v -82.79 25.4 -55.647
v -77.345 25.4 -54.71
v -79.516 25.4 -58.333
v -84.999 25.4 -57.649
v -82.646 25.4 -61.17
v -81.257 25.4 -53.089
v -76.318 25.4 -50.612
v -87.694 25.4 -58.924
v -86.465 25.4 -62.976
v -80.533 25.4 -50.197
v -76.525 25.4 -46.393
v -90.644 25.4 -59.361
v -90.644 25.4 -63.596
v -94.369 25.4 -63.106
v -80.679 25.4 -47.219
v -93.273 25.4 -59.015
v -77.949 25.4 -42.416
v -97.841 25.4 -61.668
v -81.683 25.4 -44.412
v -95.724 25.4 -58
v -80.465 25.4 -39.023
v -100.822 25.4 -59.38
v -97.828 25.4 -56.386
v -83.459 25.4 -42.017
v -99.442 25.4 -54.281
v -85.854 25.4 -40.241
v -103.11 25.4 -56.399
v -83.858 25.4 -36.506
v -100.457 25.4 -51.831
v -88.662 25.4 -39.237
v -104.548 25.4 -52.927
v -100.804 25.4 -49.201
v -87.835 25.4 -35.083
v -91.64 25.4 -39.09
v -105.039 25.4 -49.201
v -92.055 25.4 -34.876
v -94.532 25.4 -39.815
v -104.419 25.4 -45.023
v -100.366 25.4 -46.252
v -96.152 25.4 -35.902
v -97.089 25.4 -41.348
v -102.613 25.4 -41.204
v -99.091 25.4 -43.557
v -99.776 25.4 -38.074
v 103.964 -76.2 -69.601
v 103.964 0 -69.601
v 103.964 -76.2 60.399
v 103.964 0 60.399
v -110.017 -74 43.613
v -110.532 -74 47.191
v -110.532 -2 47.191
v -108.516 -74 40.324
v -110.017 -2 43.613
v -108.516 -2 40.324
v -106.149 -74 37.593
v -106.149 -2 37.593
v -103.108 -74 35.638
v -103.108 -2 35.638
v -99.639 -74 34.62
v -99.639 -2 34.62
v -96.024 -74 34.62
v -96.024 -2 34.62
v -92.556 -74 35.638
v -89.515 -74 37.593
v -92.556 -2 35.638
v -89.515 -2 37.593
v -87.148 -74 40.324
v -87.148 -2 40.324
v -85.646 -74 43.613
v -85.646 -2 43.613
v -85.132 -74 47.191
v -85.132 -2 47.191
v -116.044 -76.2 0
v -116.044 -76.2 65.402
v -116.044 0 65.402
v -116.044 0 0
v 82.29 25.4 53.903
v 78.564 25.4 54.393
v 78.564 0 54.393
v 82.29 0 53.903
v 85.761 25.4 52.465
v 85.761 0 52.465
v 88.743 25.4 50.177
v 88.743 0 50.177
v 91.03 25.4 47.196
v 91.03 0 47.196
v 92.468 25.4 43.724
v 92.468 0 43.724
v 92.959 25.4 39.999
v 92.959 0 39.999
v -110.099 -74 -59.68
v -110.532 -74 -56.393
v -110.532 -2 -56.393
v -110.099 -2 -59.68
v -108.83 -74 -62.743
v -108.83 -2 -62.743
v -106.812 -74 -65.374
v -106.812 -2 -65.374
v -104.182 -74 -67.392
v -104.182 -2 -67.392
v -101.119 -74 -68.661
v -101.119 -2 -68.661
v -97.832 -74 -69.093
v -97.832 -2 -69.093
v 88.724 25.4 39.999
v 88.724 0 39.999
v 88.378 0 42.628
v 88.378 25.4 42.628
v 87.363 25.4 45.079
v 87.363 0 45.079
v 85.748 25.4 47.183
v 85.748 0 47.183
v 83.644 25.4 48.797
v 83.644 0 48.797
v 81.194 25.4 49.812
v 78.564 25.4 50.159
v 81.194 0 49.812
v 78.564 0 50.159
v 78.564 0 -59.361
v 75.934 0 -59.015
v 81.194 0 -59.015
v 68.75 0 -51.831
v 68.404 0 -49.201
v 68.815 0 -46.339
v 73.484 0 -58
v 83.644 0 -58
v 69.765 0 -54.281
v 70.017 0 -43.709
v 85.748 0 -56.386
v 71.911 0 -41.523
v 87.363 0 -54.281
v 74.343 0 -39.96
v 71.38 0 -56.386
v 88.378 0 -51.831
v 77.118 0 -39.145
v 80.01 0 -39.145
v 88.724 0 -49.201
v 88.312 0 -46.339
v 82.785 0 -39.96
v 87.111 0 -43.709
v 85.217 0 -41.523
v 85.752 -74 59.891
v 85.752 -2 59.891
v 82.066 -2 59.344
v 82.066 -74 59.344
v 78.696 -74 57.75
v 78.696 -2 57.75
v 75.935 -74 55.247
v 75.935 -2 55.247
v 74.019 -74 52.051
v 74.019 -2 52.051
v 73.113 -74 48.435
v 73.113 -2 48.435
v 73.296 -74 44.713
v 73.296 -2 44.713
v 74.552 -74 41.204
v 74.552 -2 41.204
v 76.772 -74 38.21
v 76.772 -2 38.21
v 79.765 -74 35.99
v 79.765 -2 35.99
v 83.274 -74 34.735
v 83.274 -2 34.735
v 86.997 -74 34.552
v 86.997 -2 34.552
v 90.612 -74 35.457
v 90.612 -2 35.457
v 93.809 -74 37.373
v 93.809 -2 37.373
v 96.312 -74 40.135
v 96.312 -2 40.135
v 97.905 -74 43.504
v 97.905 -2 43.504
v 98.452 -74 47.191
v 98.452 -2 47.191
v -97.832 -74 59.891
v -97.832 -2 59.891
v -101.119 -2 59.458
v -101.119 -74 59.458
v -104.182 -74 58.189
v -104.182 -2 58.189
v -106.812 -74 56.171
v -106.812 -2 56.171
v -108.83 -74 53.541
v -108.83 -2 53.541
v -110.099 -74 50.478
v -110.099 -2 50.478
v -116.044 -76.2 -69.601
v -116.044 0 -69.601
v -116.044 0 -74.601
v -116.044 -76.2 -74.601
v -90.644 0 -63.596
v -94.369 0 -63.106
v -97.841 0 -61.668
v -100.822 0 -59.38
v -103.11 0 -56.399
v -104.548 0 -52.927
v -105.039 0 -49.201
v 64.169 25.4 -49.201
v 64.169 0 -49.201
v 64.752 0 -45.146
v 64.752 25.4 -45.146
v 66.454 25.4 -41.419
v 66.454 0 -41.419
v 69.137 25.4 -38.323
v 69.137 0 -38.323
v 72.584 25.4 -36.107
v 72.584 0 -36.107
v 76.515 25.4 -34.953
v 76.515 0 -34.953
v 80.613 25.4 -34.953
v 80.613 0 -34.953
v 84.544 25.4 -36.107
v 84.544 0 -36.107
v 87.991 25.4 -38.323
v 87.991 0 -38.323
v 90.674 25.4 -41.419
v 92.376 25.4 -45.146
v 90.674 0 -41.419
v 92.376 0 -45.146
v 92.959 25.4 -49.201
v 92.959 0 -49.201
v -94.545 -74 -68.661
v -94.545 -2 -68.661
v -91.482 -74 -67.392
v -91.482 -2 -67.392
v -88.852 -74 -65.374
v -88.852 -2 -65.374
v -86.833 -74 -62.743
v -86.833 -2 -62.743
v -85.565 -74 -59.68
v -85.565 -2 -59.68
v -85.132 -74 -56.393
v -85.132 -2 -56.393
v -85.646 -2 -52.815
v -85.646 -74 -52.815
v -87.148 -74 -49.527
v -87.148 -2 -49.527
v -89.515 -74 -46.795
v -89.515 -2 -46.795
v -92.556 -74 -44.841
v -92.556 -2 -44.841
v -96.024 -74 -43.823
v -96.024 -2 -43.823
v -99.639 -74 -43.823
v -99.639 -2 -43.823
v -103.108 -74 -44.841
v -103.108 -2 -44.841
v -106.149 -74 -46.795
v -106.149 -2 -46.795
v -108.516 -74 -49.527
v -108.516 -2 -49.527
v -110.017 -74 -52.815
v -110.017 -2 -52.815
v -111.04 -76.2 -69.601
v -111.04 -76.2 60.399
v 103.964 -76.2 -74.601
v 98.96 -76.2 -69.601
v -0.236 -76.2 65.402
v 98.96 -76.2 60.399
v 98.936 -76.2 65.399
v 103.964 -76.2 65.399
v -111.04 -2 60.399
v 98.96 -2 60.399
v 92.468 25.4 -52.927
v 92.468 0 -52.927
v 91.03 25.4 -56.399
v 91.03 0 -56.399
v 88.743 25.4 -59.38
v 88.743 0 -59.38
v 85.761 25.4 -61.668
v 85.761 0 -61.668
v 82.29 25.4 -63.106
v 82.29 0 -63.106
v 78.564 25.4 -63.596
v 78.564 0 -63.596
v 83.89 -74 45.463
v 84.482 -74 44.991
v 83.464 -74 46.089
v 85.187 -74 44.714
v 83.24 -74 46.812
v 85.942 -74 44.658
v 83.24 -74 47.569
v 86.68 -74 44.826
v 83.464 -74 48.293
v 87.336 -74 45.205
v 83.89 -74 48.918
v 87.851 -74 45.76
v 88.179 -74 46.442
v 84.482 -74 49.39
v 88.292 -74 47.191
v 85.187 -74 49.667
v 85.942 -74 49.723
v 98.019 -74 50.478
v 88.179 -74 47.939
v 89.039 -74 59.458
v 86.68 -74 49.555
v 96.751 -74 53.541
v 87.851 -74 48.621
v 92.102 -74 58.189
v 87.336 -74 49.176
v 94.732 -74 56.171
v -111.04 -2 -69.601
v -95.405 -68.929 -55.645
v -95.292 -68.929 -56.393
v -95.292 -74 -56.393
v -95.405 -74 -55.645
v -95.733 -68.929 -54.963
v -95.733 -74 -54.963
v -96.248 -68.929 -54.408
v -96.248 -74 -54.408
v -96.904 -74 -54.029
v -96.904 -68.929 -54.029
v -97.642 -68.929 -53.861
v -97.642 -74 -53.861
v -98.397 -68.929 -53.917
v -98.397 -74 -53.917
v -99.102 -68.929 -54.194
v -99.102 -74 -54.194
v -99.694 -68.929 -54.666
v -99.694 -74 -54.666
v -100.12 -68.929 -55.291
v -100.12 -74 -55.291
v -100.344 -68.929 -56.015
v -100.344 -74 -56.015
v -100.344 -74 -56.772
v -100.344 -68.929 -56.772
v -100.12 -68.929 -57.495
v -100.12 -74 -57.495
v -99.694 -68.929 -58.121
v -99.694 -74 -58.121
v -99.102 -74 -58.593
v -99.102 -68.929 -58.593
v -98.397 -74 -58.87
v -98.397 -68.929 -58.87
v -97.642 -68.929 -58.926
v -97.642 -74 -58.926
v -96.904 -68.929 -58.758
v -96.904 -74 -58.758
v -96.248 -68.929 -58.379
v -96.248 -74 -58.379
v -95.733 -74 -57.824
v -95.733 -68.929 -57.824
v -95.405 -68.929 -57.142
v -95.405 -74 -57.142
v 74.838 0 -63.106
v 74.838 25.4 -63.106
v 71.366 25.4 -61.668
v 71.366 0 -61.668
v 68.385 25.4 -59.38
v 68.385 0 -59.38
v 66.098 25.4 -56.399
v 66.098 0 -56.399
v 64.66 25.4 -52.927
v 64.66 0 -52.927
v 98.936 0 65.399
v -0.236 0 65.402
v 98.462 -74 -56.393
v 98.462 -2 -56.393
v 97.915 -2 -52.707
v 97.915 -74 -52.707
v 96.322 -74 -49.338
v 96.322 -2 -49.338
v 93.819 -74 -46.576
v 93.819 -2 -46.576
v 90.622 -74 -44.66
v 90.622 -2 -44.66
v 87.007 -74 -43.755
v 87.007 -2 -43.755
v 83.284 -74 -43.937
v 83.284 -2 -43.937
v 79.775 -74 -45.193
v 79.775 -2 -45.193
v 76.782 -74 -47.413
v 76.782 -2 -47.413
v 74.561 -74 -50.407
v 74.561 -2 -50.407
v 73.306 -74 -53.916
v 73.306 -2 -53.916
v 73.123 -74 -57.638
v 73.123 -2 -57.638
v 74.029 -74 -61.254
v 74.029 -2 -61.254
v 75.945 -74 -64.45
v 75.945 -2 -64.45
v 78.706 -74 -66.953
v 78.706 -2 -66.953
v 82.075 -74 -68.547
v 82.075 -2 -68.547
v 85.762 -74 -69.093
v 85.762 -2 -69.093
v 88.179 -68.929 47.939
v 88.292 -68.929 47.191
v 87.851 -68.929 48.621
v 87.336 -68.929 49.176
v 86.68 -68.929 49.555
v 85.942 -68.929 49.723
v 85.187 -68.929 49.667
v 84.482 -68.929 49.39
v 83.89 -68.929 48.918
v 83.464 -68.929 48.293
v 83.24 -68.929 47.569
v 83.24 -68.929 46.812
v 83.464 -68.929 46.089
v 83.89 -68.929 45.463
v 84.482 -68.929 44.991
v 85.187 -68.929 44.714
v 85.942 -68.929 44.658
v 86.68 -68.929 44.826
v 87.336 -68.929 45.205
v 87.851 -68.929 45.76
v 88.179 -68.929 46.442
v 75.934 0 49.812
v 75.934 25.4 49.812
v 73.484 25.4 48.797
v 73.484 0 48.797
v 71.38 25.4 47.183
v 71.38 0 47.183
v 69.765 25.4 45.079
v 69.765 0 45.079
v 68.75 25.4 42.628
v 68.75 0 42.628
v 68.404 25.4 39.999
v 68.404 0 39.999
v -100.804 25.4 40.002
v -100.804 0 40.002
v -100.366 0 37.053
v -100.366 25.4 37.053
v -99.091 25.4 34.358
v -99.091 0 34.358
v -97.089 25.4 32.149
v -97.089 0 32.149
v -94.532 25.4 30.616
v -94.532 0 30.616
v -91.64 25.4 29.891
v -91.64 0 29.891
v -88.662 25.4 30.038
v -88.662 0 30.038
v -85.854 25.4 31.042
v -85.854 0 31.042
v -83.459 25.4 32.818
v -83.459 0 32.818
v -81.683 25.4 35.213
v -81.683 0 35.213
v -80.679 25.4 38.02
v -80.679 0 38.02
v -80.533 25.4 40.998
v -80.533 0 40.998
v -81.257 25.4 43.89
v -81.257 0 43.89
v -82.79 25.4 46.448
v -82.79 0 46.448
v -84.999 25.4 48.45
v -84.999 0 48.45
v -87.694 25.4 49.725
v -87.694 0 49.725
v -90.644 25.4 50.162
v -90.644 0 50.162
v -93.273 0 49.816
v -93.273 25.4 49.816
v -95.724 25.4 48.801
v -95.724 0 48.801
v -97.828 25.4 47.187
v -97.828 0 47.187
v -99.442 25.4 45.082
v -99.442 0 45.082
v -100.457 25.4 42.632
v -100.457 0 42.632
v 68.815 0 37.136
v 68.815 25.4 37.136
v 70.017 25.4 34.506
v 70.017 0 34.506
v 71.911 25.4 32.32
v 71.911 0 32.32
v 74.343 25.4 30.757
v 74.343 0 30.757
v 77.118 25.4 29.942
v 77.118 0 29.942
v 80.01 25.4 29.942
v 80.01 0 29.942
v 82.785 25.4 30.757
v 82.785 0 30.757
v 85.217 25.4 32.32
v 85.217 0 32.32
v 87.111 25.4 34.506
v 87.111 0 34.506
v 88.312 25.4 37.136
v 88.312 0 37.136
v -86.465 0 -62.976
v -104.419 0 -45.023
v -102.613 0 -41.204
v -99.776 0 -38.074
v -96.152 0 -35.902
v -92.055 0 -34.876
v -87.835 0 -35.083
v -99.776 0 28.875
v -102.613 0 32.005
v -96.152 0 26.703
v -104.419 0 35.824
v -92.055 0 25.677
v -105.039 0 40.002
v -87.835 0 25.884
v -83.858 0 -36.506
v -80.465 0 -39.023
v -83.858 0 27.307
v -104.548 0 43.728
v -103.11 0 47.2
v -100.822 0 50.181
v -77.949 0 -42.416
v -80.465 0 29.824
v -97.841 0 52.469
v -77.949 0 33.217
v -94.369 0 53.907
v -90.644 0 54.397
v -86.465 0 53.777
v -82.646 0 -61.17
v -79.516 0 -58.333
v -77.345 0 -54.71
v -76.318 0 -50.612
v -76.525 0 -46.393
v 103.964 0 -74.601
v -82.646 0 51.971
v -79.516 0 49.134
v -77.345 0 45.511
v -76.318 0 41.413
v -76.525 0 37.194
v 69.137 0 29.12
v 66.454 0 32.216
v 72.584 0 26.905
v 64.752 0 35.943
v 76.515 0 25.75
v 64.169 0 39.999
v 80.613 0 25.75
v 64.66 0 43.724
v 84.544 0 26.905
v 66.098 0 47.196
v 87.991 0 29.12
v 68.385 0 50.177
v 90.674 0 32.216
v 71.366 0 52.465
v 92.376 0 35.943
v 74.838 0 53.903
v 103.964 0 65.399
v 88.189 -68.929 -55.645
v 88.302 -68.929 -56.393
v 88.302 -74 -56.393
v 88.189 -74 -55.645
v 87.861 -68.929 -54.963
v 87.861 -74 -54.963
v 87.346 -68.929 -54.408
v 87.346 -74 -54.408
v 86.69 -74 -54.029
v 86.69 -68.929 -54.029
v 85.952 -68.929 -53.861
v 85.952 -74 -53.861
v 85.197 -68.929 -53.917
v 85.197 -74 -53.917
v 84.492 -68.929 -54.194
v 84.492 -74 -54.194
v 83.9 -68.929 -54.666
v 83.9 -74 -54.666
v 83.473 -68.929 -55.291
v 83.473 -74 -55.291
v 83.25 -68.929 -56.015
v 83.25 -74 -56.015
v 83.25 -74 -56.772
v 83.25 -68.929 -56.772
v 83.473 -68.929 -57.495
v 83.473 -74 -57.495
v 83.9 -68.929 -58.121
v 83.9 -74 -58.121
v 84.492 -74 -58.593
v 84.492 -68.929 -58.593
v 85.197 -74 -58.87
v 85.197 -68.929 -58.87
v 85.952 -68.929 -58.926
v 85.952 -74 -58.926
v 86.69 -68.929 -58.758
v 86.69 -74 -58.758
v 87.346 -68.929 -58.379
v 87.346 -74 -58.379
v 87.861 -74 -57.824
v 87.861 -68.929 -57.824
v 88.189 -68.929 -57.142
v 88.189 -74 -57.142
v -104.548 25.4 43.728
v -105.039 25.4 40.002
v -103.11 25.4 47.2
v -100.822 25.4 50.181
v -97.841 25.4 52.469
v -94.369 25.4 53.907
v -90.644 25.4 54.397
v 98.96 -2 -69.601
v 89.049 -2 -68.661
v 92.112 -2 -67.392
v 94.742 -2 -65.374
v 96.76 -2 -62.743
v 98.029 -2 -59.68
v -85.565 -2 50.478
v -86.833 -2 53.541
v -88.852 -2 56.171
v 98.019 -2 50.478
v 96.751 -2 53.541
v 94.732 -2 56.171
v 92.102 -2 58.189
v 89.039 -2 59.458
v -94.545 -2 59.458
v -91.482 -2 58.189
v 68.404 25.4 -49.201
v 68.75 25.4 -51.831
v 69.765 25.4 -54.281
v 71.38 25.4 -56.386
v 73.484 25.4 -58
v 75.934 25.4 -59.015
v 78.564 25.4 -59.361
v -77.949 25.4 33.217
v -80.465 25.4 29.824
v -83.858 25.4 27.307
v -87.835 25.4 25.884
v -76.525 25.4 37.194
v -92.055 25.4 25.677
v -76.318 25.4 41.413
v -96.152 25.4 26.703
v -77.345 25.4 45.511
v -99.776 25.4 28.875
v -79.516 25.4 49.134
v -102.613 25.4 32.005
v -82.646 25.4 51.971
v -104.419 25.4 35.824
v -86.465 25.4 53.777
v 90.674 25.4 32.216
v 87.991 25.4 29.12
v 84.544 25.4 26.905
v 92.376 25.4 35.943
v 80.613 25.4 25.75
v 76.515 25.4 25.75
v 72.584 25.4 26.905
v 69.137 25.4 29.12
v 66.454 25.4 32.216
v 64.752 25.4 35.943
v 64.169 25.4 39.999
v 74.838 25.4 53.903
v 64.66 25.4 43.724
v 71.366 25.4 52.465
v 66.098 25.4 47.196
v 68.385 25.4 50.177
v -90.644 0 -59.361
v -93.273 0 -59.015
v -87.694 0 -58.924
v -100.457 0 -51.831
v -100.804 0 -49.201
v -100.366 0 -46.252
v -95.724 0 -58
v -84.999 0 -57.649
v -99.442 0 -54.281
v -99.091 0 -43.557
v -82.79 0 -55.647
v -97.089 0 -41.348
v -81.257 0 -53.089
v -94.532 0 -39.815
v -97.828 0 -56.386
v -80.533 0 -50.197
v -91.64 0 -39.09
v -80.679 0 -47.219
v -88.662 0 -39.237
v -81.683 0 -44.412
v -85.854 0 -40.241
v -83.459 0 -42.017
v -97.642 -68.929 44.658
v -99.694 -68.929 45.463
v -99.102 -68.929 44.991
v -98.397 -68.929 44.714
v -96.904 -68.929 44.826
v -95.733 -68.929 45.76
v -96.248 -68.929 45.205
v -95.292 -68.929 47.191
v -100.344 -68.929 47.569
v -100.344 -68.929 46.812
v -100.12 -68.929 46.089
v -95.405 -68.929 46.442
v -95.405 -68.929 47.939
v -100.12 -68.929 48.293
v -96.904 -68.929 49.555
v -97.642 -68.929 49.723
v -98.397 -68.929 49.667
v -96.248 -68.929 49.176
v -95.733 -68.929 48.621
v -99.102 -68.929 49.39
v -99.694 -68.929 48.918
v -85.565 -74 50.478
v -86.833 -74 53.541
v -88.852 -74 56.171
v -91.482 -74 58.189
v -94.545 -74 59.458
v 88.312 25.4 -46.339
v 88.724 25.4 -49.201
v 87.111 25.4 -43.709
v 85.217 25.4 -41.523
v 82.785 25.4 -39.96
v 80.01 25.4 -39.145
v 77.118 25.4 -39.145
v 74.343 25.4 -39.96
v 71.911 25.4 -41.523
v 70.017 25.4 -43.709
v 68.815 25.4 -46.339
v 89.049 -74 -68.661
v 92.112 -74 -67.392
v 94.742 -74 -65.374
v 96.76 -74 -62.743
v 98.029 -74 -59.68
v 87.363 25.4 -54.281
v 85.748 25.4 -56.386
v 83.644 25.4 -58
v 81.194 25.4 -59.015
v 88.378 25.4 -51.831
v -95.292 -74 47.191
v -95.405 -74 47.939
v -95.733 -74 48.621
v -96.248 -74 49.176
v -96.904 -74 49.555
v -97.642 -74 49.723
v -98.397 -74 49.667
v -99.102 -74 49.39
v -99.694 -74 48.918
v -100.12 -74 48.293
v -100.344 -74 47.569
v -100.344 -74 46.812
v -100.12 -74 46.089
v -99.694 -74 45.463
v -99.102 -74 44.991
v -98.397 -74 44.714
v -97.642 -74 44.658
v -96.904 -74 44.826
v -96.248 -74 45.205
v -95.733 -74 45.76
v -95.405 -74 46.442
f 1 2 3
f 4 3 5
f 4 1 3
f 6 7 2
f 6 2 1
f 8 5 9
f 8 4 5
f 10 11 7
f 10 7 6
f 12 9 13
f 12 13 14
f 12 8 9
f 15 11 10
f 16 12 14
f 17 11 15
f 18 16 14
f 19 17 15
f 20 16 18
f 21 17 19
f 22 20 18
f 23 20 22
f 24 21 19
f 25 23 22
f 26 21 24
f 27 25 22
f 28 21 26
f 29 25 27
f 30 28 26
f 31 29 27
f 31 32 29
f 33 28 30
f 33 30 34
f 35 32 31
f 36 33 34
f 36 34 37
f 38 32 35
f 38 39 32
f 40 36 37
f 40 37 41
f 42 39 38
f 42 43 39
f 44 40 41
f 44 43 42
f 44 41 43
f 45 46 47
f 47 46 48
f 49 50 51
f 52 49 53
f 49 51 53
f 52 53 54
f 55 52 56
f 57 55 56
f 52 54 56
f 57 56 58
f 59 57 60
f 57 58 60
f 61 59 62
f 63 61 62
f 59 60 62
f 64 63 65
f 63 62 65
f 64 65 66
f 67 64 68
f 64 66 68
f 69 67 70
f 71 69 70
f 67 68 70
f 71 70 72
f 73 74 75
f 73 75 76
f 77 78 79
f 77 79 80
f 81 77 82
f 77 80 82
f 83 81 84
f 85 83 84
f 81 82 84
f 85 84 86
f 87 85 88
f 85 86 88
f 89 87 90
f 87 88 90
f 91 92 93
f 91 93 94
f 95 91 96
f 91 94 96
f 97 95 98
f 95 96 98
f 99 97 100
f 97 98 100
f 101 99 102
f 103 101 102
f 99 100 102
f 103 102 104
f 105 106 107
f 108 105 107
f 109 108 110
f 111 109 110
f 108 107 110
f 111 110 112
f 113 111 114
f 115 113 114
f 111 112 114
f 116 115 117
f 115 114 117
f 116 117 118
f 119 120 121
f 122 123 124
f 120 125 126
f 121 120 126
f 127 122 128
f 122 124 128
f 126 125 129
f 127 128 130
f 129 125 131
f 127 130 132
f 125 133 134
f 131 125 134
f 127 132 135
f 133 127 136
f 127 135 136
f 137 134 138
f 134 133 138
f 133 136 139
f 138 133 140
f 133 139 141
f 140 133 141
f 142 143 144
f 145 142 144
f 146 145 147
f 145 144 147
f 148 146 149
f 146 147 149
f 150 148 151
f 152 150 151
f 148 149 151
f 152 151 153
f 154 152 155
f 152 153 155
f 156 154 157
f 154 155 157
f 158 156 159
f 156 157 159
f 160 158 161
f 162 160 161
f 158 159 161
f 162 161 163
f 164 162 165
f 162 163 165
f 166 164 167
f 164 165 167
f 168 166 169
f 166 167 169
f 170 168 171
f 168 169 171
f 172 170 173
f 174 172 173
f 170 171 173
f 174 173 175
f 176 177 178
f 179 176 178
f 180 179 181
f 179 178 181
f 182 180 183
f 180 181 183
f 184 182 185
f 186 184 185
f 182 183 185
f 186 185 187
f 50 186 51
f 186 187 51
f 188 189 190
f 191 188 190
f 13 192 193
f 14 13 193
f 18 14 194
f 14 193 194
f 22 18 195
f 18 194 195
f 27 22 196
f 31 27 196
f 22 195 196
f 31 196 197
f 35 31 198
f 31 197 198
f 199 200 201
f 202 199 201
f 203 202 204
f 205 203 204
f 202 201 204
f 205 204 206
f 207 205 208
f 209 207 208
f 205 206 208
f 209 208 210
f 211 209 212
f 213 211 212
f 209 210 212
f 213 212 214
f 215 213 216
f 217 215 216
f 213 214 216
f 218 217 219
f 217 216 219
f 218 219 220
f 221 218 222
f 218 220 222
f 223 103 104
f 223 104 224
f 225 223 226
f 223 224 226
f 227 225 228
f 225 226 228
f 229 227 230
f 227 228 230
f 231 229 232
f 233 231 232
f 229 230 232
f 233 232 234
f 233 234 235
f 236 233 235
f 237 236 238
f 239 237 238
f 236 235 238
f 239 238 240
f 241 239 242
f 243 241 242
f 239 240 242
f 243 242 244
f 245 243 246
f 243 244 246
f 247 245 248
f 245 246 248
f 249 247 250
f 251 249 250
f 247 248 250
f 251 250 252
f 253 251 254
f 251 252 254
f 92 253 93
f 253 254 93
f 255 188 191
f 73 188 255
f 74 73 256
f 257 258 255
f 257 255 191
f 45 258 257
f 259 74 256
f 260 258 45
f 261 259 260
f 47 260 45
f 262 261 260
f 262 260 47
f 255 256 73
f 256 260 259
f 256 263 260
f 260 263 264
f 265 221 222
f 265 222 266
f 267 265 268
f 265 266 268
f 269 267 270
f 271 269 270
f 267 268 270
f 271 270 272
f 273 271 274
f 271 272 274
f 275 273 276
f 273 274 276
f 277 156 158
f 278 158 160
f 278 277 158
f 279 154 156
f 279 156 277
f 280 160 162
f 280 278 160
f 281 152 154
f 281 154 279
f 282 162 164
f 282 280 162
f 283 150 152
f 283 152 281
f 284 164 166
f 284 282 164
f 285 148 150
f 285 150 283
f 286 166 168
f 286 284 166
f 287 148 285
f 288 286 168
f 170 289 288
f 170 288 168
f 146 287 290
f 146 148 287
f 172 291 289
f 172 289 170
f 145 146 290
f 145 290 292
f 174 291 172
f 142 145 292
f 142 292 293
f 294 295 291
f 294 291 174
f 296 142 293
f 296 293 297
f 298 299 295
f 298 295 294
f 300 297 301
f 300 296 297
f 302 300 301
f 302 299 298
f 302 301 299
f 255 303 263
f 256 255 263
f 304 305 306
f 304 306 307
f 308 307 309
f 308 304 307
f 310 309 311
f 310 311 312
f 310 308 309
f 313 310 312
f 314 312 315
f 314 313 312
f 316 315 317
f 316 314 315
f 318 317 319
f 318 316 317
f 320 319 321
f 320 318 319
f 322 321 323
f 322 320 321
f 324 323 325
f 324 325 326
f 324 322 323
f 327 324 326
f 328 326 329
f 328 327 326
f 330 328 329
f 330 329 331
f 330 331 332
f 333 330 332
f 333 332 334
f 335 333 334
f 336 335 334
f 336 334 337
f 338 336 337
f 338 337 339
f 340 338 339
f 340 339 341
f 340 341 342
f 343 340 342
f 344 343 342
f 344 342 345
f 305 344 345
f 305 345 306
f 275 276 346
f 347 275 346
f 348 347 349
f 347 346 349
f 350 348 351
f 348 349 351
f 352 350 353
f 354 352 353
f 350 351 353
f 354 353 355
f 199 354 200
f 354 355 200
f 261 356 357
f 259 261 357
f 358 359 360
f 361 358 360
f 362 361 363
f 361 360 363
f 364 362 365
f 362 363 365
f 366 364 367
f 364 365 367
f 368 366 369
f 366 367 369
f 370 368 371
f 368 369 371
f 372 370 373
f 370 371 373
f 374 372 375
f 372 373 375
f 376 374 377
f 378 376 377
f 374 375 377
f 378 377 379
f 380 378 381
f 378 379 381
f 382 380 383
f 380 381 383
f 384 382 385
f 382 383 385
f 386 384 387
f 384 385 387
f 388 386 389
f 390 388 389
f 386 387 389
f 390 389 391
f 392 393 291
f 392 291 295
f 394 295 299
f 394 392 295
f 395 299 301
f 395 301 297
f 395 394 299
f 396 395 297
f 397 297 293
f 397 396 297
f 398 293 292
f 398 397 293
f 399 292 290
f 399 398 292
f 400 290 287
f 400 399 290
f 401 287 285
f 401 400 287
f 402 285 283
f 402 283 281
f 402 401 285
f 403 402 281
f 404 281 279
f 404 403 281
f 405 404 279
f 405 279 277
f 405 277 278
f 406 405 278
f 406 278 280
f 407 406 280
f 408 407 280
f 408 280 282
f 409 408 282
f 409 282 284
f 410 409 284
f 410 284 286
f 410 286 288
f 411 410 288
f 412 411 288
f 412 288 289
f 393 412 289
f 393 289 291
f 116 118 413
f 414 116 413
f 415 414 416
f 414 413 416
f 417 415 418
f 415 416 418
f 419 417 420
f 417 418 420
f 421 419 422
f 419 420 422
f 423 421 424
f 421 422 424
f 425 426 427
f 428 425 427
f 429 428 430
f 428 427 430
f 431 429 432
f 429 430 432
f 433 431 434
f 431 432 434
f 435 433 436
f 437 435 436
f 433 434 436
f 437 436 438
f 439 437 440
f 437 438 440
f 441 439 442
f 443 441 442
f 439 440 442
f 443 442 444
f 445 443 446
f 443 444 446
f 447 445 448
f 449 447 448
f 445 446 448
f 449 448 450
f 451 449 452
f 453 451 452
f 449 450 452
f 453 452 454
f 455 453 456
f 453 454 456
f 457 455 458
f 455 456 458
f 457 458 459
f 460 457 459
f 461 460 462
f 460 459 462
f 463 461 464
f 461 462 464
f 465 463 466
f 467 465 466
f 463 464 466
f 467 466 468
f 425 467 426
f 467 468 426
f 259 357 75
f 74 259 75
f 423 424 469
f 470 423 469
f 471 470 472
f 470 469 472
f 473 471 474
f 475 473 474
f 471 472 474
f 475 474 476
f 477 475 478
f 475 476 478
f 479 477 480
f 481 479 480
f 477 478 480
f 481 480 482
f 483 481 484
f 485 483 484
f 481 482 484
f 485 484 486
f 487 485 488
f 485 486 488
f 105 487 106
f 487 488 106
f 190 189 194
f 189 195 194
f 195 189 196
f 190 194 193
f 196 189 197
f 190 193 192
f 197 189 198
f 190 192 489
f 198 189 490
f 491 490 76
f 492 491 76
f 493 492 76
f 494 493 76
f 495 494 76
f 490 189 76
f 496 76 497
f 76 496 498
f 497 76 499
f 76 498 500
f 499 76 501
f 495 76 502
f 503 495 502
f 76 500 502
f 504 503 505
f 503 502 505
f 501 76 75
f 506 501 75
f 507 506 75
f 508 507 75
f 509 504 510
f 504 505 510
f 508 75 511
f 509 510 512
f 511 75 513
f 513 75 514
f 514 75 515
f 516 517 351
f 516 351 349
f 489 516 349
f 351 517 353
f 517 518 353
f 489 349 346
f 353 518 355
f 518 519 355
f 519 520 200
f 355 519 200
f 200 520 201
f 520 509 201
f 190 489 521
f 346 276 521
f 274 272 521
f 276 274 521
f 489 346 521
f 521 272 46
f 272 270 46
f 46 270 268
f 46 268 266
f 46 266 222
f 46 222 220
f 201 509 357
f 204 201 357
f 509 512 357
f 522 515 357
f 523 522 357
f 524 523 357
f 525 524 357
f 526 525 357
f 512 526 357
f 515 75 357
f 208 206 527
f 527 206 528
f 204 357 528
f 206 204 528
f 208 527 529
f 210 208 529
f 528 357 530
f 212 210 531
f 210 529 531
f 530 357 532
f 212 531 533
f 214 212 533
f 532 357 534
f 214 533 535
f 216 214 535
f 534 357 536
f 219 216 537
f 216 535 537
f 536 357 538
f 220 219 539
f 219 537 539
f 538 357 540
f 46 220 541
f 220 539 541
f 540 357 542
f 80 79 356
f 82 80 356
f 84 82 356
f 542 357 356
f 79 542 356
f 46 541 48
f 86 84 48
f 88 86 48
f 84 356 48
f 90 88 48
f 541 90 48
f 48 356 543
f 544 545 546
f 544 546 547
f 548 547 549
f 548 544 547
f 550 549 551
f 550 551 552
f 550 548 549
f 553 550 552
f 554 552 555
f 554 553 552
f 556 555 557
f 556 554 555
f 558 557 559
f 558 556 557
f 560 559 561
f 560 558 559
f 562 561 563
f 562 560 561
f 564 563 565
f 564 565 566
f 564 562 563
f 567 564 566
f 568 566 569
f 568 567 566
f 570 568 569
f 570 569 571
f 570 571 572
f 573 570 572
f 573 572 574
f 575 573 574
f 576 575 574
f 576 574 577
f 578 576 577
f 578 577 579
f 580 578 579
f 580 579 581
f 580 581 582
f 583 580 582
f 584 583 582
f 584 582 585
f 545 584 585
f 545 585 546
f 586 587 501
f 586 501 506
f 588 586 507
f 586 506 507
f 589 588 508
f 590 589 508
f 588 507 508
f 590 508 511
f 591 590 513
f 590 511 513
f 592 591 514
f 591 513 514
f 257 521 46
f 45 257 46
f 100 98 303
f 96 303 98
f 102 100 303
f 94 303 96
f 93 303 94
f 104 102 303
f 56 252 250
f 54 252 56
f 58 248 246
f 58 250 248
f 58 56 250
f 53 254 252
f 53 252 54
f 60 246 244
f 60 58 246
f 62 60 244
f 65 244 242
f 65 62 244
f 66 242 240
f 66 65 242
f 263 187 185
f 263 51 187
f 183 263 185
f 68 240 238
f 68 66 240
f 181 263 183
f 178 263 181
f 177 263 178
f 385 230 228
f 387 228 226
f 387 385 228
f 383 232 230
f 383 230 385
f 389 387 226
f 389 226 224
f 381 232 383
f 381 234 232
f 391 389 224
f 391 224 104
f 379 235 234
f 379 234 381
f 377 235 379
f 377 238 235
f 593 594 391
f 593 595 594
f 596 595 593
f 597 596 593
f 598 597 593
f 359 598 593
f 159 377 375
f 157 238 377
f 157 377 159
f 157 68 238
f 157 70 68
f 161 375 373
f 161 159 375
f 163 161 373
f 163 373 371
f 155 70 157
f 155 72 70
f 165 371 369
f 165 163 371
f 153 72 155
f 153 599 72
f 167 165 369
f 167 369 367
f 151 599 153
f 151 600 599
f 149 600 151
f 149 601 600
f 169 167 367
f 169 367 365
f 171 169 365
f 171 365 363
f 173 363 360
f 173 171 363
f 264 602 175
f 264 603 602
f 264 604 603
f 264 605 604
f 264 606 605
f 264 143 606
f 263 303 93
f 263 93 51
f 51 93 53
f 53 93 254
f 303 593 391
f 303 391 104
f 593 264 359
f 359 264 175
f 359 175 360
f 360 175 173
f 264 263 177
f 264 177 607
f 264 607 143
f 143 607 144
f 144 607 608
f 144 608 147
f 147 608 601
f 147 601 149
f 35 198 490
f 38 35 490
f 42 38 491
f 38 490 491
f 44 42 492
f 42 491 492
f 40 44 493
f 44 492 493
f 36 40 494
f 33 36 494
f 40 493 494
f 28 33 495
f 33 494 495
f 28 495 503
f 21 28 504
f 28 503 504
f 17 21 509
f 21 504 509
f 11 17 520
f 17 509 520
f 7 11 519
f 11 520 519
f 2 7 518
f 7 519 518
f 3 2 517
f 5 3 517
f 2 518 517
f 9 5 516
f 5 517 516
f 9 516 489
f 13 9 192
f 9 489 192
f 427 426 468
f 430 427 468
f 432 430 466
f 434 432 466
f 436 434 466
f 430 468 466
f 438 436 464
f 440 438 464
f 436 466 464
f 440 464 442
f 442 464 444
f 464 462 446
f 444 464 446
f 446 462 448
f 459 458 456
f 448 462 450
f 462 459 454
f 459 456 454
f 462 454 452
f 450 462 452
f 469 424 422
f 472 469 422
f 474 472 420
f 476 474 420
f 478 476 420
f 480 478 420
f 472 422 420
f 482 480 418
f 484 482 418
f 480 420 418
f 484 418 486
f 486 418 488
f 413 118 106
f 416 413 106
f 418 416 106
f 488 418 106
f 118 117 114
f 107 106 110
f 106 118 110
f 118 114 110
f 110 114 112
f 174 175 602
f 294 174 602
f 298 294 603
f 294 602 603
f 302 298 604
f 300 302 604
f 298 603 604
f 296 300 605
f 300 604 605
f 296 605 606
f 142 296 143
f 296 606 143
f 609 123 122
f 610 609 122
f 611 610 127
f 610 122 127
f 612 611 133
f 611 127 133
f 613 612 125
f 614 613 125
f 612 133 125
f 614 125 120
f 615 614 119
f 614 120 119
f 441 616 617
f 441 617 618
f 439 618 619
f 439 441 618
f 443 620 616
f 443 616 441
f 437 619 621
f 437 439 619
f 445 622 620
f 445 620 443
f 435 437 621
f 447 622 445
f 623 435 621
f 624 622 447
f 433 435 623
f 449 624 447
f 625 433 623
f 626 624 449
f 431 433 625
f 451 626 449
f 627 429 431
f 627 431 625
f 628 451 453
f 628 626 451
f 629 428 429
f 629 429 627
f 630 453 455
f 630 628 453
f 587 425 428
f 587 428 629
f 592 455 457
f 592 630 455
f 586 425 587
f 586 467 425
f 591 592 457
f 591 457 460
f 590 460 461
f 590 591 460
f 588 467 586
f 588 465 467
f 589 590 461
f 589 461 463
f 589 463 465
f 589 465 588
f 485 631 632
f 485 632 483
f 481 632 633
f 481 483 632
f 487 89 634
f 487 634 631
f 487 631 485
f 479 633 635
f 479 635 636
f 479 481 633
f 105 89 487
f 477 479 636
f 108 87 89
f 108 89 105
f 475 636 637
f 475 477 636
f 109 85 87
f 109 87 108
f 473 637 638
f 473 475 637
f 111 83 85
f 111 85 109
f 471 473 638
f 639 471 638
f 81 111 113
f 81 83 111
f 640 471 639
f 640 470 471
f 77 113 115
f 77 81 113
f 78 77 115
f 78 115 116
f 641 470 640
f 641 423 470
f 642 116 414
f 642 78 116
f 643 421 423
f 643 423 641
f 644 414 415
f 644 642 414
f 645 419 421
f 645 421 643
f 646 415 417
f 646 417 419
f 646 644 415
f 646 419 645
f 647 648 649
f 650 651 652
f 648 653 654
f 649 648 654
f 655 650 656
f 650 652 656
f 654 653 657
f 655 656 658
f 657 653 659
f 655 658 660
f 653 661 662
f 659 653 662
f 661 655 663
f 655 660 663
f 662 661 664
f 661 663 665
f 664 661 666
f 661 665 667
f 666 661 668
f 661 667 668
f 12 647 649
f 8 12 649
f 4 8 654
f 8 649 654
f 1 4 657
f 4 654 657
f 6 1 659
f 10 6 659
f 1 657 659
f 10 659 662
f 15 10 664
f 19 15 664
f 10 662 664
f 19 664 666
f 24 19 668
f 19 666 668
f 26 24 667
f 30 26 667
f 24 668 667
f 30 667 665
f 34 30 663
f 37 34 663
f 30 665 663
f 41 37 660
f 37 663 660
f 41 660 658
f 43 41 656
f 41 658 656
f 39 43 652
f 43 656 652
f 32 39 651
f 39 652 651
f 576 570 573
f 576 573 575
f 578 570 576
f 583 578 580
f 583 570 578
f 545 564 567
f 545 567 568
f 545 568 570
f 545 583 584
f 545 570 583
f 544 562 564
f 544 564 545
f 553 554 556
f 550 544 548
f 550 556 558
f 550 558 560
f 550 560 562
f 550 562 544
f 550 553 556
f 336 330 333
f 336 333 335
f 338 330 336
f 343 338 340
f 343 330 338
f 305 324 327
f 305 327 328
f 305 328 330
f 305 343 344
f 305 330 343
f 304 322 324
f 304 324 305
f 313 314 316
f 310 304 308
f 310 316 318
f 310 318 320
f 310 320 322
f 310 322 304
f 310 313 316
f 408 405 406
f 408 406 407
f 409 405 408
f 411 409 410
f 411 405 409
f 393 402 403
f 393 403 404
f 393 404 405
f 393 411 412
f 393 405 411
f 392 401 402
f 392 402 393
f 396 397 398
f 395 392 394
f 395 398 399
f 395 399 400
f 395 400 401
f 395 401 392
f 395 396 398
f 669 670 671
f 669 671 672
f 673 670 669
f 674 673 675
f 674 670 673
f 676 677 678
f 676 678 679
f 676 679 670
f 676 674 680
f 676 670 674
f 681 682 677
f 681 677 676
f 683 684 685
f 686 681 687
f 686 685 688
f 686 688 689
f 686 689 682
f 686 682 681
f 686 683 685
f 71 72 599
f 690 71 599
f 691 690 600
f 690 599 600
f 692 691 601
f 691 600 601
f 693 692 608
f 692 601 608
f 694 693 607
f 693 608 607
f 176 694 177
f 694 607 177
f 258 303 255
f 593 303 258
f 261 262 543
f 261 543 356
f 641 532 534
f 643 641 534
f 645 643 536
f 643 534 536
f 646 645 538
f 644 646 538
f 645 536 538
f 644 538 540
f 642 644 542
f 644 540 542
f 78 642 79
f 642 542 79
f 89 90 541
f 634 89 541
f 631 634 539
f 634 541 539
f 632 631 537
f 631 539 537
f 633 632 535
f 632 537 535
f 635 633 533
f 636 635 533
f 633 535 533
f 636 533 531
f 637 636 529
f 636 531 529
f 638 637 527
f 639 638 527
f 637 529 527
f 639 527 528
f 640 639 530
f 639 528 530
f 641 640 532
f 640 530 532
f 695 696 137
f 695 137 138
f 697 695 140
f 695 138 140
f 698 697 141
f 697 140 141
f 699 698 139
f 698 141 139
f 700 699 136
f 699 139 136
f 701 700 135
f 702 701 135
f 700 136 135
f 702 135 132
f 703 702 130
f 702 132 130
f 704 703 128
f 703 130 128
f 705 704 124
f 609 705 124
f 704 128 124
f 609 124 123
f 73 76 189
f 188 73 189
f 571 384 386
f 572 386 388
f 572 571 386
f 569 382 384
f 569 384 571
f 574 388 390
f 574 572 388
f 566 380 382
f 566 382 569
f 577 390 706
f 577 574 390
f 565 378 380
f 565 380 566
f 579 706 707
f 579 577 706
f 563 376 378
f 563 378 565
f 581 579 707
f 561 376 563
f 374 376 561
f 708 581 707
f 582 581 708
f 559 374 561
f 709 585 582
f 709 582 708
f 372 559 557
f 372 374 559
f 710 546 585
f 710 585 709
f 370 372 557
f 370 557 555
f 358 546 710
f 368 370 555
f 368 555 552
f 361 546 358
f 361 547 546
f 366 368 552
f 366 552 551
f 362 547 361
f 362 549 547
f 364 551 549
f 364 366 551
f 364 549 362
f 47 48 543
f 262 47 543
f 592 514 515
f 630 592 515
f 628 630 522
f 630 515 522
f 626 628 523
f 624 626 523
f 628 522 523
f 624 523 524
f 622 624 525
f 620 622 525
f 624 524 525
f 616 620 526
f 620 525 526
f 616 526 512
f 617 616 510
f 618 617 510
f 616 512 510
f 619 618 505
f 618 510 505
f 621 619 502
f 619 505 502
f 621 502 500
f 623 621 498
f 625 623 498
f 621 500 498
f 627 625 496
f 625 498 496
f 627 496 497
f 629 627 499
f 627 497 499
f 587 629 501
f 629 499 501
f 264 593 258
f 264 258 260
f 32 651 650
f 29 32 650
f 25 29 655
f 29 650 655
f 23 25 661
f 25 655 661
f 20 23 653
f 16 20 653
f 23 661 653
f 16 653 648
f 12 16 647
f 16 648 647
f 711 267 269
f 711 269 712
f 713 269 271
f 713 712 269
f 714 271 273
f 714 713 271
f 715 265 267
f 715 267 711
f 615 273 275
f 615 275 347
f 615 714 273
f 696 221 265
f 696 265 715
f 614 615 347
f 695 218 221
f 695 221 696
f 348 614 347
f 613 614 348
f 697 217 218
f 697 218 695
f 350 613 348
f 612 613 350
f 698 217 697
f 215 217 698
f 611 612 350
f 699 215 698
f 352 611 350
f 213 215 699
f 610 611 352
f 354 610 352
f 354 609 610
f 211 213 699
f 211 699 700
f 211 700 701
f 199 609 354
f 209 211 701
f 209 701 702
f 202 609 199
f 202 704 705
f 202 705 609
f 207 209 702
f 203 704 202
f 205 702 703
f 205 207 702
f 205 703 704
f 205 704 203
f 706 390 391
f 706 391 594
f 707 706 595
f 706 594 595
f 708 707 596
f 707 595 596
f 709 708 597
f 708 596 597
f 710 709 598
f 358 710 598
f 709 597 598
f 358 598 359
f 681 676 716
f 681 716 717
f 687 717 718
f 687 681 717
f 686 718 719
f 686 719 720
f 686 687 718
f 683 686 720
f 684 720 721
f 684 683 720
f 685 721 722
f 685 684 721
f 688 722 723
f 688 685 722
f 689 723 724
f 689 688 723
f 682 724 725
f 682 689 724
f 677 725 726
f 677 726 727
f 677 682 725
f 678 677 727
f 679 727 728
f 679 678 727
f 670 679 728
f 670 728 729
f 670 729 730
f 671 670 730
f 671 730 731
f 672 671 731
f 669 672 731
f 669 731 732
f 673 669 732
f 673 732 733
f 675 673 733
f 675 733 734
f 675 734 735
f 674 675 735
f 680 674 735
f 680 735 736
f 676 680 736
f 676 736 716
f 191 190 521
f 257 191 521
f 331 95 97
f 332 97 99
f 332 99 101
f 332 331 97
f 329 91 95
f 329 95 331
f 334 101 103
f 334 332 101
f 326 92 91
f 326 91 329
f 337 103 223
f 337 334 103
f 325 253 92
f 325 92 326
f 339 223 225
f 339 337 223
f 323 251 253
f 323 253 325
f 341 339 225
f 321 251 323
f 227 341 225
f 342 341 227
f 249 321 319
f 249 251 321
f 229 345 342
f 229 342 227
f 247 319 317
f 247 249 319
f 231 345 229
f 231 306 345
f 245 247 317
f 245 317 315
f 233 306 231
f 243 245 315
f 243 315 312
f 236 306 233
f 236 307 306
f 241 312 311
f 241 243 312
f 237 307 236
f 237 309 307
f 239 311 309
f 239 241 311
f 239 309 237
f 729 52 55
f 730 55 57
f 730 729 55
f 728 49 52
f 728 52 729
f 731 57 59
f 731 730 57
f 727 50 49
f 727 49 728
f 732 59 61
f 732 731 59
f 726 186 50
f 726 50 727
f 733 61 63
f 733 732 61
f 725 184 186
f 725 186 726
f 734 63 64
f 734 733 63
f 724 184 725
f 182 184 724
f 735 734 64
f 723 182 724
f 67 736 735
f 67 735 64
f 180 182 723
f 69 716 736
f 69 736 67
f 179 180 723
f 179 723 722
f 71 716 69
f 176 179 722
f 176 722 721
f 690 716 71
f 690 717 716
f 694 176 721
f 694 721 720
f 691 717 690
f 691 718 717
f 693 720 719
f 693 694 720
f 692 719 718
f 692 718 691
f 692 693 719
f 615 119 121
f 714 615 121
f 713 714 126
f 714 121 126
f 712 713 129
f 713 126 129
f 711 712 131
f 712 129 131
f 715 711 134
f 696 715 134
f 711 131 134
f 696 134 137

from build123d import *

# Parameters (mm, degrees)
F0_W     = 210
F0_H     = 130
F1_DEPTH = 2
F2_DEPTH = 76.2
F4_DEPTH = 25.4
F5_R     = 2.54
F6_DEPTH = 72
F7_DEPTH = 66.929


with BuildPart() as f1:
    # F0 (on Front) → F1 (new body)
    with BuildSketch(Plane.XZ):
        with Locations((-6.0398806084, -4.6014347222)):
            Rectangle(F0_W, F0_H)
    extrude(amount=F1_DEPTH)

    # F0 (on Front) → F2 (join)
    with BuildSketch(Plane.XZ):
        Polygon((-0.235864222, 65.4023652778), (-111.0638493299, 65.4023652778), (-116.0436806083, 65.4023652778), (-116.0436806083, 60.398529828), (-116.0436806083, -4.06776e-05), (-116.0436806084, -69.6014285846), (-116.0436806084, -74.6014347222), (-111.0398806084, -74.6014347222), (98.9601193916, -74.6014347222), (103.9639193853, -74.6014347222), (103.9639193853, -69.6011838004), (103.9639193916, 60.3988544052), (103.9639193916, 65.3985652778), (98.9361506701, 65.3985652778), align=None)
        with Locations((-6.0398806084, -4.6014347222)):
            Rectangle(F0_W, F0_H, mode=Mode.SUBTRACT)
    extrude(amount=F2_DEPTH)

    # F3 (on face) → F4 (join)
    with BuildSketch(Plane(origin=(0, 0, 0), x_dir=(-1, 0, 0), z_dir=(0, 1, 0))):
        with BuildLine():
            ThreePointArc((-92.9588075555, 39.9985652778), (-78.5639193916, 25.6036771139), (-64.1690312277, 39.9985652778))
            ThreePointArc((-64.1690312277, 39.9985652778), (-68.3851963565, 50.1772883129), (-78.5639193916, 54.3934534417))
            Line((-78.5639193916, 54.3934534417), (-78.5639193916, 50.1585652778))
            ThreePointArc((-78.5639193916, 50.1585652778), (-71.3797144948, 47.1827701747), (-68.4039193916, 39.9985652778))
            ThreePointArc((-68.4039193916, 39.9985652778), (-78.5639193916, 29.8385652778), (-88.7239193916, 39.9985652778))
            Line((-88.7239193916, 39.9985652778), (-92.9588075555, 39.9985652778))
        make_face()
        with BuildLine():
            Line((-78.5639193916, 50.1585652778), (-78.5639193916, 54.3934534417))
            ThreePointArc((-78.5639193916, 54.3934534417), (-88.7426424267, 50.1772883129), (-92.9588075555, 39.9985652778))
            Line((-92.9588075555, 39.9985652778), (-88.7239193916, 39.9985652778))
            ThreePointArc((-88.7239193916, 39.9985652778), (-85.7481242885, 47.1827701747), (-78.5639193916, 50.1585652778))
        make_face()
        with BuildLine():
            ThreePointArc((-64.1690312214, -49.2014347222), (-78.5639193853, -34.8065465583), (-92.9588075492, -49.2014347222))
            Line((-92.9588075492, -49.2014347222), (-88.7239193853, -49.2014347222))
            ThreePointArc((-88.7239193853, -49.2014347222), (-78.5639193853, -39.0414347222), (-68.4039193853, -49.2014347222))
            ThreePointArc((-68.4039193853, -49.2014347222), (-71.3797144885, -56.385639619), (-78.5639193853, -59.3614347222))
            Line((-78.5639193853, -59.3614347222), (-78.5639193853, -63.5963228861))
            ThreePointArc((-78.5639193853, -63.5963228861), (-68.3851963502, -59.3801577573), (-64.1690312214, -49.2014347222))
        make_face()
        with BuildLine():
            Line((-88.7239193853, -49.2014347222), (-92.9588075492, -49.2014347222))
            ThreePointArc((-92.9588075492, -49.2014347222), (-88.7426424204, -59.3801577573), (-78.5639193853, -63.5963228861))
            Line((-78.5639193853, -63.5963228861), (-78.5639193853, -59.3614347222))
            ThreePointArc((-78.5639193853, -59.3614347222), (-85.7481242822, -56.385639619), (-88.7239193853, -49.2014347222))
        make_face()
        with BuildLine():
            ThreePointArc((105.0385687722, 40.0023652778), (100.8224036434, 50.1810883129), (90.6436806083, 54.3972534417))
            Line((90.6436806083, 54.3972534417), (90.6436806083, 50.1623652778))
            ThreePointArc((90.6436806083, 50.1623652778), (97.8278855051, 47.1865701747), (100.8036806083, 40.0023652778))
            Line((100.8036806083, 40.0023652778), (105.0385687722, 40.0023652778))
        make_face()
        with BuildLine():
            Line((90.6436806083, 50.1623652778), (90.6436806083, 54.3972534417))
            ThreePointArc((90.6436806083, 54.3972534417), (80.4649575731, 29.8236422427), (105.0385687722, 40.0023652778))
            Line((105.0385687722, 40.0023652778), (100.8036806083, 40.0023652778))
            ThreePointArc((100.8036806083, 40.0023652778), (83.4594757114, 32.818160381), (90.6436806083, 50.1623652778))
        make_face()
        with BuildLine():
            ThreePointArc((105.0385687723, -49.2014347222), (80.4649575733, -39.0227116871), (90.6436806084, -63.5963228861))
            Line((90.6436806084, -63.5963228861), (90.6436806084, -59.3614347222))
            ThreePointArc((90.6436806084, -59.3614347222), (83.4594757115, -42.0172298253), (100.8036806084, -49.2014347222))
            Line((100.8036806084, -49.2014347222), (105.0385687723, -49.2014347222))
        make_face()
        with BuildLine():
            Line((90.6436806084, -59.3614347222), (90.6436806084, -63.5963228861))
            ThreePointArc((90.6436806084, -63.5963228861), (100.8224036435, -59.3801577573), (105.0385687723, -49.2014347222))
            Line((105.0385687723, -49.2014347222), (100.8036806084, -49.2014347222))
            ThreePointArc((100.8036806084, -49.2014347222), (97.8278855052, -56.385639619), (90.6436806084, -59.3614347222))
        make_face()
    extrude(amount=F4_DEPTH)

    # F5 (on face) → F6 (join)
    with BuildSketch(Plane.XZ.offset(2)):
        with BuildLine():
            ThreePointArc((98.4618922379, -56.3934347222), (76.7816361169, -47.4131786011), (85.7618922379, -69.0934347222))
            ThreePointArc((85.7618922379, -69.0934347222), (94.742148359, -65.3736908433), (98.4618922379, -56.3934347222))
        make_face()
        with Locations((85.7618922379, -56.3934347222)):
            Circle(F5_R, mode=Mode.SUBTRACT)
        with BuildLine():
            ThreePointArc((-110.5318806084, -56.3934347222), (-106.8121367295, -65.3736908433), (-97.8318806084, -69.0934347222))
            ThreePointArc((-97.8318806084, -69.0934347222), (-88.8516244873, -65.3736908433), (-85.1318806084, -56.3934347222))
            ThreePointArc((-85.1318806084, -56.3934347222), (-97.8318806084, -43.6934347222), (-110.5318806084, -56.3934347222))
        make_face()
        with Locations((-97.8318806084, -56.3934347222)):
            Circle(F5_R, mode=Mode.SUBTRACT)
        with BuildLine():
            ThreePointArc((-97.8318806084, 59.8905652778), (-106.8121367295, 56.1708213989), (-110.5318806084, 47.1905652778))
            ThreePointArc((-110.5318806084, 47.1905652778), (-97.8318806084, 34.4905652778), (-85.1318806084, 47.1905652778))
            ThreePointArc((-85.1318806084, 47.1905652778), (-88.8516244873, 56.1708213989), (-97.8318806084, 59.8905652778))
        make_face()
        with Locations((-97.8318806084, 47.1905652778)):
            Circle(F5_R, mode=Mode.SUBTRACT)
        with BuildLine():
            ThreePointArc((85.7521193916, 59.8905652778), (76.7718632705, 38.2103091567), (98.4521193916, 47.1905652778))
            ThreePointArc((98.4521193916, 47.1905652778), (94.7323755127, 56.1708213989), (85.7521193916, 59.8905652778))
        make_face()
        with Locations((85.7521193916, 47.1905652778)):
            Circle(F5_R, mode=Mode.SUBTRACT)
    extrude(amount=F6_DEPTH)

    # F5 (on face) → F7 (join)
    with BuildSketch(Plane.XZ.offset(2)):
        with Locations((-97.8318806084, -56.3934347222)):
            Circle(F5_R)
        with Locations((85.7618922379, -56.3934347222)):
            Circle(F5_R)
        with Locations((-97.8318806084, 47.1905652778)):
            Circle(F5_R)
        with Locations((85.7521193916, 47.1905652778)):
            Circle(F5_R)
    extrude(amount=F7_DEPTH)


solid = f1.part
